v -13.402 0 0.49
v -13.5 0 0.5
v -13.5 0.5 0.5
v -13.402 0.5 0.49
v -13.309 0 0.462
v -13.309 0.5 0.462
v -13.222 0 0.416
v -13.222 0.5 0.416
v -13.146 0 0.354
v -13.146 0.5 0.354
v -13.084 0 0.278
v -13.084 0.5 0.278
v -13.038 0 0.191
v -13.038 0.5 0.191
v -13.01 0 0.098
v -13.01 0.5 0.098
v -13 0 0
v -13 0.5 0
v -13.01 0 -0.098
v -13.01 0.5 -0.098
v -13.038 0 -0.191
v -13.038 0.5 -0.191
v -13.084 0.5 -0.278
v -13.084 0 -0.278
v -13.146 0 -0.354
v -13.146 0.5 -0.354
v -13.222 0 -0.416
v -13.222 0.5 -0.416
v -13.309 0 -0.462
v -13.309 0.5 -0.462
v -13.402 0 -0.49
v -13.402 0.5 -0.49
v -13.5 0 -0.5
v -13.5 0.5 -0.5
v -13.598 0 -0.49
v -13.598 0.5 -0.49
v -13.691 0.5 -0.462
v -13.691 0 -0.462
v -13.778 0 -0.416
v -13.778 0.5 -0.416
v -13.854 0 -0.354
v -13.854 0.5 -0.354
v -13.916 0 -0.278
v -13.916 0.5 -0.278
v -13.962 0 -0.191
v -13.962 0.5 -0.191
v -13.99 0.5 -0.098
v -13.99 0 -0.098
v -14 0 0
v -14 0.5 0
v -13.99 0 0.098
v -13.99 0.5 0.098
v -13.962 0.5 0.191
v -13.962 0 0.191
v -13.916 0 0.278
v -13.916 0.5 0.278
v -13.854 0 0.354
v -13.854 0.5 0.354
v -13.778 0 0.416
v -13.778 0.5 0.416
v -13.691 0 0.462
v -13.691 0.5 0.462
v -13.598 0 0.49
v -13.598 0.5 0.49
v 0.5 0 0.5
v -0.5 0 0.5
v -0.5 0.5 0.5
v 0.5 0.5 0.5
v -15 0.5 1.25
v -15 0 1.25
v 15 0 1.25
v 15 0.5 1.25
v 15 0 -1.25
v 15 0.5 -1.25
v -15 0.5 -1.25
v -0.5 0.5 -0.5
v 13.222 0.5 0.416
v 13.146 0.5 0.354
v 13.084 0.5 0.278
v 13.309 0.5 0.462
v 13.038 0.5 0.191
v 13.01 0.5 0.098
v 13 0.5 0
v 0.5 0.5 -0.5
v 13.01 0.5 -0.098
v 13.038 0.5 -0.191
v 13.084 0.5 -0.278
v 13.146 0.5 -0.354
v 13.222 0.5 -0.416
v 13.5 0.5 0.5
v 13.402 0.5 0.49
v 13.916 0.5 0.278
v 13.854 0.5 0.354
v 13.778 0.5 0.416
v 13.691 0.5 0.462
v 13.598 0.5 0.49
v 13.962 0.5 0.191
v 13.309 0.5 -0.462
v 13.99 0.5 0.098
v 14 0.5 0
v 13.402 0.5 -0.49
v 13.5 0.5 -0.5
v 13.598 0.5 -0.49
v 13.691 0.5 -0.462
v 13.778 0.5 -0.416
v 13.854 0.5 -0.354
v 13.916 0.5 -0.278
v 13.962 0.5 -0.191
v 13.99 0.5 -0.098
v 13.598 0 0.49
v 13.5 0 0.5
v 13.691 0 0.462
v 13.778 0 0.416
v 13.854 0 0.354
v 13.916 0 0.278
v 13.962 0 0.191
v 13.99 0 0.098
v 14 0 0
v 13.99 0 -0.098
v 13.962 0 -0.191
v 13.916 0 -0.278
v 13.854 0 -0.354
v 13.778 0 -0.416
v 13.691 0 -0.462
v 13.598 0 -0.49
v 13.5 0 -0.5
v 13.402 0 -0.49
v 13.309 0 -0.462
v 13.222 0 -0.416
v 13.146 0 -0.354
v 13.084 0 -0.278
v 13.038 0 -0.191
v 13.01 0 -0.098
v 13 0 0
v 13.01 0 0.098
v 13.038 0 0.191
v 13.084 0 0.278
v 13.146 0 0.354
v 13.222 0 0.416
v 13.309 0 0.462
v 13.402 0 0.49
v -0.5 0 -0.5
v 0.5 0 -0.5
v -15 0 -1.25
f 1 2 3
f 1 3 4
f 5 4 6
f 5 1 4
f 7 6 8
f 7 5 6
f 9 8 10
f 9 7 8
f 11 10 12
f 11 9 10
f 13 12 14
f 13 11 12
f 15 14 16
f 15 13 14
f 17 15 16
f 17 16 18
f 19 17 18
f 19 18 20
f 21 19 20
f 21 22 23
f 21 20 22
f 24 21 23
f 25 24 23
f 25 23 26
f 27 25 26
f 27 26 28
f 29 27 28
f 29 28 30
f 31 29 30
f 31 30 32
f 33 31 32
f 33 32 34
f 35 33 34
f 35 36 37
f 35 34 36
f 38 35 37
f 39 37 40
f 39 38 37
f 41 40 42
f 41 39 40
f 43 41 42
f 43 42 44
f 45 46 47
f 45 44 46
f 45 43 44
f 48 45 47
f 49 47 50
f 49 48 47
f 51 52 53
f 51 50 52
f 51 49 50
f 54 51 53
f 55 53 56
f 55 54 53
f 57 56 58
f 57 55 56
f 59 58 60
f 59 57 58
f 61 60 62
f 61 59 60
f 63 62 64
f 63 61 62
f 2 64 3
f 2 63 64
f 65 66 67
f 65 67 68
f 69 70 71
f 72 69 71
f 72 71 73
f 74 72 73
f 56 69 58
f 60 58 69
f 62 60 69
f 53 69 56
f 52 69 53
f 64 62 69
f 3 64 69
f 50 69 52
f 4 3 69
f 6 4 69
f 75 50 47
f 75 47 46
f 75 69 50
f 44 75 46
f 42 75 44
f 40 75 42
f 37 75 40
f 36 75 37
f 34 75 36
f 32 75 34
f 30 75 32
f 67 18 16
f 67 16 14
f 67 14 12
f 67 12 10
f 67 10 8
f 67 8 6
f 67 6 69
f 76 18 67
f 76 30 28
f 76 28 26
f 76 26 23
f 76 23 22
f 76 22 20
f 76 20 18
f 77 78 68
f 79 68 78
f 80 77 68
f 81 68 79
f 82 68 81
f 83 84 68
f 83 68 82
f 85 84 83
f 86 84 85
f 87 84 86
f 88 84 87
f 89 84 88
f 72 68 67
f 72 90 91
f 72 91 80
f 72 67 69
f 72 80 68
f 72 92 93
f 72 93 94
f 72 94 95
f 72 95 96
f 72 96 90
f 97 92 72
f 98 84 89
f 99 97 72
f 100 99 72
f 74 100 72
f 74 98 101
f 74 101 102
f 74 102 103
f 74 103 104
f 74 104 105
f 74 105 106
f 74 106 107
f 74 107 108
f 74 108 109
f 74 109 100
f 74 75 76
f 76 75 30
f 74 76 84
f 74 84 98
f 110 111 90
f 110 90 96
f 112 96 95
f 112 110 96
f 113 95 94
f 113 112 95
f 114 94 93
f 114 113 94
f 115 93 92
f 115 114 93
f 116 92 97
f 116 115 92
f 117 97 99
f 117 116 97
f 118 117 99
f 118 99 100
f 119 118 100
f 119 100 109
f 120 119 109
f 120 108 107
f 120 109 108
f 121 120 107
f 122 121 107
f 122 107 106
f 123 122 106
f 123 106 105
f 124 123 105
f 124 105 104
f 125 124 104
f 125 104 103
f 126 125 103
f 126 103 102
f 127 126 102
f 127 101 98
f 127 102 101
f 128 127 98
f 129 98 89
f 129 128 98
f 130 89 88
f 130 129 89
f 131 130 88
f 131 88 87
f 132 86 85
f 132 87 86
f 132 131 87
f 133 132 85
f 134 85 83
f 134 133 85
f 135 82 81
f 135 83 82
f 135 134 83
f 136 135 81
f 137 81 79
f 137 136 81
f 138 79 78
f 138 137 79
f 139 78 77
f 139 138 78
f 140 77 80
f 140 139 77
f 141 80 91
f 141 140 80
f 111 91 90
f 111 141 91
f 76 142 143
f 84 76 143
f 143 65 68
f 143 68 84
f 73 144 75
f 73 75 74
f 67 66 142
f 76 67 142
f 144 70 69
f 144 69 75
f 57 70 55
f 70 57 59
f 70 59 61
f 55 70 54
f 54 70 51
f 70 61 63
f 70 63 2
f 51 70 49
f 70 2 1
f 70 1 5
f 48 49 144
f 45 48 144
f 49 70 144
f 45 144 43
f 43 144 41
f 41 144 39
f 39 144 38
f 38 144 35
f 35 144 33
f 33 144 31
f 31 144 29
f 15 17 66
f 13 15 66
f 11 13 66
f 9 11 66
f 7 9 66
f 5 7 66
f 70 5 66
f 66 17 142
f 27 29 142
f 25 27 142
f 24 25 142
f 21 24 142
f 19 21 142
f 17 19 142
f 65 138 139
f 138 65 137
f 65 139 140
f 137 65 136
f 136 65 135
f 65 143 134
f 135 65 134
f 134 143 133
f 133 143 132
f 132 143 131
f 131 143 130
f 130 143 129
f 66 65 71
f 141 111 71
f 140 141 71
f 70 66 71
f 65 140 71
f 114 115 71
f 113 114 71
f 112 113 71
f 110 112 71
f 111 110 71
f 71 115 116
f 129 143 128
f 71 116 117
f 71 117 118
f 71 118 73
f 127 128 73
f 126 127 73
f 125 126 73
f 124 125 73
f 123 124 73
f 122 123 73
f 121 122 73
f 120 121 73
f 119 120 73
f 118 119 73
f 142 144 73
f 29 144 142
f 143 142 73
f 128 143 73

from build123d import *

# Parameters (mm, degrees)
SKETCH2_W               = 30
SKETCH2_H               = 2.5
BOSS_EXTRUDE1_DEPTH     = 0.5
CUT_EXTRUDE1_DEPTH      = 16.060295482
CUT_EXTRUDE1_DEPTH_BACK = 16.060295482
SKETCH3_R               = 0.5
SKETCH3_W               = 1
SKETCH3_H               = 1


with BuildPart() as part:
    # Sketch2 → Boss-Extrude1 (new body)
    with BuildSketch(Plane(origin=(0, 0, 0), x_dir=(1, 0, 0), z_dir=(0, 1, 0))):
        Rectangle(SKETCH2_W, SKETCH2_H)
    extrude(amount=BOSS_EXTRUDE1_DEPTH)

    # Sketch3 → Cut-Extrude1 (cut, two sides: drawn at the far end of the back side and taken through both)
    with BuildSketch(Plane(origin=(0, 0.5, 0), x_dir=(1, 0, 0), z_dir=(0, 1, 0)).offset(-CUT_EXTRUDE1_DEPTH_BACK)):
        with Locations(Location((-13.5, 0, 0), (0, 0, 270))):
            Circle(SKETCH3_R)
        with Locations(Location((13.5, 0, 0), (0, 0, 270))):
            Circle(SKETCH3_R)
        Rectangle(SKETCH3_W, SKETCH3_H)
    extrude(amount=CUT_EXTRUDE1_DEPTH + CUT_EXTRUDE1_DEPTH_BACK, mode=Mode.SUBTRACT)


solid = part.part
